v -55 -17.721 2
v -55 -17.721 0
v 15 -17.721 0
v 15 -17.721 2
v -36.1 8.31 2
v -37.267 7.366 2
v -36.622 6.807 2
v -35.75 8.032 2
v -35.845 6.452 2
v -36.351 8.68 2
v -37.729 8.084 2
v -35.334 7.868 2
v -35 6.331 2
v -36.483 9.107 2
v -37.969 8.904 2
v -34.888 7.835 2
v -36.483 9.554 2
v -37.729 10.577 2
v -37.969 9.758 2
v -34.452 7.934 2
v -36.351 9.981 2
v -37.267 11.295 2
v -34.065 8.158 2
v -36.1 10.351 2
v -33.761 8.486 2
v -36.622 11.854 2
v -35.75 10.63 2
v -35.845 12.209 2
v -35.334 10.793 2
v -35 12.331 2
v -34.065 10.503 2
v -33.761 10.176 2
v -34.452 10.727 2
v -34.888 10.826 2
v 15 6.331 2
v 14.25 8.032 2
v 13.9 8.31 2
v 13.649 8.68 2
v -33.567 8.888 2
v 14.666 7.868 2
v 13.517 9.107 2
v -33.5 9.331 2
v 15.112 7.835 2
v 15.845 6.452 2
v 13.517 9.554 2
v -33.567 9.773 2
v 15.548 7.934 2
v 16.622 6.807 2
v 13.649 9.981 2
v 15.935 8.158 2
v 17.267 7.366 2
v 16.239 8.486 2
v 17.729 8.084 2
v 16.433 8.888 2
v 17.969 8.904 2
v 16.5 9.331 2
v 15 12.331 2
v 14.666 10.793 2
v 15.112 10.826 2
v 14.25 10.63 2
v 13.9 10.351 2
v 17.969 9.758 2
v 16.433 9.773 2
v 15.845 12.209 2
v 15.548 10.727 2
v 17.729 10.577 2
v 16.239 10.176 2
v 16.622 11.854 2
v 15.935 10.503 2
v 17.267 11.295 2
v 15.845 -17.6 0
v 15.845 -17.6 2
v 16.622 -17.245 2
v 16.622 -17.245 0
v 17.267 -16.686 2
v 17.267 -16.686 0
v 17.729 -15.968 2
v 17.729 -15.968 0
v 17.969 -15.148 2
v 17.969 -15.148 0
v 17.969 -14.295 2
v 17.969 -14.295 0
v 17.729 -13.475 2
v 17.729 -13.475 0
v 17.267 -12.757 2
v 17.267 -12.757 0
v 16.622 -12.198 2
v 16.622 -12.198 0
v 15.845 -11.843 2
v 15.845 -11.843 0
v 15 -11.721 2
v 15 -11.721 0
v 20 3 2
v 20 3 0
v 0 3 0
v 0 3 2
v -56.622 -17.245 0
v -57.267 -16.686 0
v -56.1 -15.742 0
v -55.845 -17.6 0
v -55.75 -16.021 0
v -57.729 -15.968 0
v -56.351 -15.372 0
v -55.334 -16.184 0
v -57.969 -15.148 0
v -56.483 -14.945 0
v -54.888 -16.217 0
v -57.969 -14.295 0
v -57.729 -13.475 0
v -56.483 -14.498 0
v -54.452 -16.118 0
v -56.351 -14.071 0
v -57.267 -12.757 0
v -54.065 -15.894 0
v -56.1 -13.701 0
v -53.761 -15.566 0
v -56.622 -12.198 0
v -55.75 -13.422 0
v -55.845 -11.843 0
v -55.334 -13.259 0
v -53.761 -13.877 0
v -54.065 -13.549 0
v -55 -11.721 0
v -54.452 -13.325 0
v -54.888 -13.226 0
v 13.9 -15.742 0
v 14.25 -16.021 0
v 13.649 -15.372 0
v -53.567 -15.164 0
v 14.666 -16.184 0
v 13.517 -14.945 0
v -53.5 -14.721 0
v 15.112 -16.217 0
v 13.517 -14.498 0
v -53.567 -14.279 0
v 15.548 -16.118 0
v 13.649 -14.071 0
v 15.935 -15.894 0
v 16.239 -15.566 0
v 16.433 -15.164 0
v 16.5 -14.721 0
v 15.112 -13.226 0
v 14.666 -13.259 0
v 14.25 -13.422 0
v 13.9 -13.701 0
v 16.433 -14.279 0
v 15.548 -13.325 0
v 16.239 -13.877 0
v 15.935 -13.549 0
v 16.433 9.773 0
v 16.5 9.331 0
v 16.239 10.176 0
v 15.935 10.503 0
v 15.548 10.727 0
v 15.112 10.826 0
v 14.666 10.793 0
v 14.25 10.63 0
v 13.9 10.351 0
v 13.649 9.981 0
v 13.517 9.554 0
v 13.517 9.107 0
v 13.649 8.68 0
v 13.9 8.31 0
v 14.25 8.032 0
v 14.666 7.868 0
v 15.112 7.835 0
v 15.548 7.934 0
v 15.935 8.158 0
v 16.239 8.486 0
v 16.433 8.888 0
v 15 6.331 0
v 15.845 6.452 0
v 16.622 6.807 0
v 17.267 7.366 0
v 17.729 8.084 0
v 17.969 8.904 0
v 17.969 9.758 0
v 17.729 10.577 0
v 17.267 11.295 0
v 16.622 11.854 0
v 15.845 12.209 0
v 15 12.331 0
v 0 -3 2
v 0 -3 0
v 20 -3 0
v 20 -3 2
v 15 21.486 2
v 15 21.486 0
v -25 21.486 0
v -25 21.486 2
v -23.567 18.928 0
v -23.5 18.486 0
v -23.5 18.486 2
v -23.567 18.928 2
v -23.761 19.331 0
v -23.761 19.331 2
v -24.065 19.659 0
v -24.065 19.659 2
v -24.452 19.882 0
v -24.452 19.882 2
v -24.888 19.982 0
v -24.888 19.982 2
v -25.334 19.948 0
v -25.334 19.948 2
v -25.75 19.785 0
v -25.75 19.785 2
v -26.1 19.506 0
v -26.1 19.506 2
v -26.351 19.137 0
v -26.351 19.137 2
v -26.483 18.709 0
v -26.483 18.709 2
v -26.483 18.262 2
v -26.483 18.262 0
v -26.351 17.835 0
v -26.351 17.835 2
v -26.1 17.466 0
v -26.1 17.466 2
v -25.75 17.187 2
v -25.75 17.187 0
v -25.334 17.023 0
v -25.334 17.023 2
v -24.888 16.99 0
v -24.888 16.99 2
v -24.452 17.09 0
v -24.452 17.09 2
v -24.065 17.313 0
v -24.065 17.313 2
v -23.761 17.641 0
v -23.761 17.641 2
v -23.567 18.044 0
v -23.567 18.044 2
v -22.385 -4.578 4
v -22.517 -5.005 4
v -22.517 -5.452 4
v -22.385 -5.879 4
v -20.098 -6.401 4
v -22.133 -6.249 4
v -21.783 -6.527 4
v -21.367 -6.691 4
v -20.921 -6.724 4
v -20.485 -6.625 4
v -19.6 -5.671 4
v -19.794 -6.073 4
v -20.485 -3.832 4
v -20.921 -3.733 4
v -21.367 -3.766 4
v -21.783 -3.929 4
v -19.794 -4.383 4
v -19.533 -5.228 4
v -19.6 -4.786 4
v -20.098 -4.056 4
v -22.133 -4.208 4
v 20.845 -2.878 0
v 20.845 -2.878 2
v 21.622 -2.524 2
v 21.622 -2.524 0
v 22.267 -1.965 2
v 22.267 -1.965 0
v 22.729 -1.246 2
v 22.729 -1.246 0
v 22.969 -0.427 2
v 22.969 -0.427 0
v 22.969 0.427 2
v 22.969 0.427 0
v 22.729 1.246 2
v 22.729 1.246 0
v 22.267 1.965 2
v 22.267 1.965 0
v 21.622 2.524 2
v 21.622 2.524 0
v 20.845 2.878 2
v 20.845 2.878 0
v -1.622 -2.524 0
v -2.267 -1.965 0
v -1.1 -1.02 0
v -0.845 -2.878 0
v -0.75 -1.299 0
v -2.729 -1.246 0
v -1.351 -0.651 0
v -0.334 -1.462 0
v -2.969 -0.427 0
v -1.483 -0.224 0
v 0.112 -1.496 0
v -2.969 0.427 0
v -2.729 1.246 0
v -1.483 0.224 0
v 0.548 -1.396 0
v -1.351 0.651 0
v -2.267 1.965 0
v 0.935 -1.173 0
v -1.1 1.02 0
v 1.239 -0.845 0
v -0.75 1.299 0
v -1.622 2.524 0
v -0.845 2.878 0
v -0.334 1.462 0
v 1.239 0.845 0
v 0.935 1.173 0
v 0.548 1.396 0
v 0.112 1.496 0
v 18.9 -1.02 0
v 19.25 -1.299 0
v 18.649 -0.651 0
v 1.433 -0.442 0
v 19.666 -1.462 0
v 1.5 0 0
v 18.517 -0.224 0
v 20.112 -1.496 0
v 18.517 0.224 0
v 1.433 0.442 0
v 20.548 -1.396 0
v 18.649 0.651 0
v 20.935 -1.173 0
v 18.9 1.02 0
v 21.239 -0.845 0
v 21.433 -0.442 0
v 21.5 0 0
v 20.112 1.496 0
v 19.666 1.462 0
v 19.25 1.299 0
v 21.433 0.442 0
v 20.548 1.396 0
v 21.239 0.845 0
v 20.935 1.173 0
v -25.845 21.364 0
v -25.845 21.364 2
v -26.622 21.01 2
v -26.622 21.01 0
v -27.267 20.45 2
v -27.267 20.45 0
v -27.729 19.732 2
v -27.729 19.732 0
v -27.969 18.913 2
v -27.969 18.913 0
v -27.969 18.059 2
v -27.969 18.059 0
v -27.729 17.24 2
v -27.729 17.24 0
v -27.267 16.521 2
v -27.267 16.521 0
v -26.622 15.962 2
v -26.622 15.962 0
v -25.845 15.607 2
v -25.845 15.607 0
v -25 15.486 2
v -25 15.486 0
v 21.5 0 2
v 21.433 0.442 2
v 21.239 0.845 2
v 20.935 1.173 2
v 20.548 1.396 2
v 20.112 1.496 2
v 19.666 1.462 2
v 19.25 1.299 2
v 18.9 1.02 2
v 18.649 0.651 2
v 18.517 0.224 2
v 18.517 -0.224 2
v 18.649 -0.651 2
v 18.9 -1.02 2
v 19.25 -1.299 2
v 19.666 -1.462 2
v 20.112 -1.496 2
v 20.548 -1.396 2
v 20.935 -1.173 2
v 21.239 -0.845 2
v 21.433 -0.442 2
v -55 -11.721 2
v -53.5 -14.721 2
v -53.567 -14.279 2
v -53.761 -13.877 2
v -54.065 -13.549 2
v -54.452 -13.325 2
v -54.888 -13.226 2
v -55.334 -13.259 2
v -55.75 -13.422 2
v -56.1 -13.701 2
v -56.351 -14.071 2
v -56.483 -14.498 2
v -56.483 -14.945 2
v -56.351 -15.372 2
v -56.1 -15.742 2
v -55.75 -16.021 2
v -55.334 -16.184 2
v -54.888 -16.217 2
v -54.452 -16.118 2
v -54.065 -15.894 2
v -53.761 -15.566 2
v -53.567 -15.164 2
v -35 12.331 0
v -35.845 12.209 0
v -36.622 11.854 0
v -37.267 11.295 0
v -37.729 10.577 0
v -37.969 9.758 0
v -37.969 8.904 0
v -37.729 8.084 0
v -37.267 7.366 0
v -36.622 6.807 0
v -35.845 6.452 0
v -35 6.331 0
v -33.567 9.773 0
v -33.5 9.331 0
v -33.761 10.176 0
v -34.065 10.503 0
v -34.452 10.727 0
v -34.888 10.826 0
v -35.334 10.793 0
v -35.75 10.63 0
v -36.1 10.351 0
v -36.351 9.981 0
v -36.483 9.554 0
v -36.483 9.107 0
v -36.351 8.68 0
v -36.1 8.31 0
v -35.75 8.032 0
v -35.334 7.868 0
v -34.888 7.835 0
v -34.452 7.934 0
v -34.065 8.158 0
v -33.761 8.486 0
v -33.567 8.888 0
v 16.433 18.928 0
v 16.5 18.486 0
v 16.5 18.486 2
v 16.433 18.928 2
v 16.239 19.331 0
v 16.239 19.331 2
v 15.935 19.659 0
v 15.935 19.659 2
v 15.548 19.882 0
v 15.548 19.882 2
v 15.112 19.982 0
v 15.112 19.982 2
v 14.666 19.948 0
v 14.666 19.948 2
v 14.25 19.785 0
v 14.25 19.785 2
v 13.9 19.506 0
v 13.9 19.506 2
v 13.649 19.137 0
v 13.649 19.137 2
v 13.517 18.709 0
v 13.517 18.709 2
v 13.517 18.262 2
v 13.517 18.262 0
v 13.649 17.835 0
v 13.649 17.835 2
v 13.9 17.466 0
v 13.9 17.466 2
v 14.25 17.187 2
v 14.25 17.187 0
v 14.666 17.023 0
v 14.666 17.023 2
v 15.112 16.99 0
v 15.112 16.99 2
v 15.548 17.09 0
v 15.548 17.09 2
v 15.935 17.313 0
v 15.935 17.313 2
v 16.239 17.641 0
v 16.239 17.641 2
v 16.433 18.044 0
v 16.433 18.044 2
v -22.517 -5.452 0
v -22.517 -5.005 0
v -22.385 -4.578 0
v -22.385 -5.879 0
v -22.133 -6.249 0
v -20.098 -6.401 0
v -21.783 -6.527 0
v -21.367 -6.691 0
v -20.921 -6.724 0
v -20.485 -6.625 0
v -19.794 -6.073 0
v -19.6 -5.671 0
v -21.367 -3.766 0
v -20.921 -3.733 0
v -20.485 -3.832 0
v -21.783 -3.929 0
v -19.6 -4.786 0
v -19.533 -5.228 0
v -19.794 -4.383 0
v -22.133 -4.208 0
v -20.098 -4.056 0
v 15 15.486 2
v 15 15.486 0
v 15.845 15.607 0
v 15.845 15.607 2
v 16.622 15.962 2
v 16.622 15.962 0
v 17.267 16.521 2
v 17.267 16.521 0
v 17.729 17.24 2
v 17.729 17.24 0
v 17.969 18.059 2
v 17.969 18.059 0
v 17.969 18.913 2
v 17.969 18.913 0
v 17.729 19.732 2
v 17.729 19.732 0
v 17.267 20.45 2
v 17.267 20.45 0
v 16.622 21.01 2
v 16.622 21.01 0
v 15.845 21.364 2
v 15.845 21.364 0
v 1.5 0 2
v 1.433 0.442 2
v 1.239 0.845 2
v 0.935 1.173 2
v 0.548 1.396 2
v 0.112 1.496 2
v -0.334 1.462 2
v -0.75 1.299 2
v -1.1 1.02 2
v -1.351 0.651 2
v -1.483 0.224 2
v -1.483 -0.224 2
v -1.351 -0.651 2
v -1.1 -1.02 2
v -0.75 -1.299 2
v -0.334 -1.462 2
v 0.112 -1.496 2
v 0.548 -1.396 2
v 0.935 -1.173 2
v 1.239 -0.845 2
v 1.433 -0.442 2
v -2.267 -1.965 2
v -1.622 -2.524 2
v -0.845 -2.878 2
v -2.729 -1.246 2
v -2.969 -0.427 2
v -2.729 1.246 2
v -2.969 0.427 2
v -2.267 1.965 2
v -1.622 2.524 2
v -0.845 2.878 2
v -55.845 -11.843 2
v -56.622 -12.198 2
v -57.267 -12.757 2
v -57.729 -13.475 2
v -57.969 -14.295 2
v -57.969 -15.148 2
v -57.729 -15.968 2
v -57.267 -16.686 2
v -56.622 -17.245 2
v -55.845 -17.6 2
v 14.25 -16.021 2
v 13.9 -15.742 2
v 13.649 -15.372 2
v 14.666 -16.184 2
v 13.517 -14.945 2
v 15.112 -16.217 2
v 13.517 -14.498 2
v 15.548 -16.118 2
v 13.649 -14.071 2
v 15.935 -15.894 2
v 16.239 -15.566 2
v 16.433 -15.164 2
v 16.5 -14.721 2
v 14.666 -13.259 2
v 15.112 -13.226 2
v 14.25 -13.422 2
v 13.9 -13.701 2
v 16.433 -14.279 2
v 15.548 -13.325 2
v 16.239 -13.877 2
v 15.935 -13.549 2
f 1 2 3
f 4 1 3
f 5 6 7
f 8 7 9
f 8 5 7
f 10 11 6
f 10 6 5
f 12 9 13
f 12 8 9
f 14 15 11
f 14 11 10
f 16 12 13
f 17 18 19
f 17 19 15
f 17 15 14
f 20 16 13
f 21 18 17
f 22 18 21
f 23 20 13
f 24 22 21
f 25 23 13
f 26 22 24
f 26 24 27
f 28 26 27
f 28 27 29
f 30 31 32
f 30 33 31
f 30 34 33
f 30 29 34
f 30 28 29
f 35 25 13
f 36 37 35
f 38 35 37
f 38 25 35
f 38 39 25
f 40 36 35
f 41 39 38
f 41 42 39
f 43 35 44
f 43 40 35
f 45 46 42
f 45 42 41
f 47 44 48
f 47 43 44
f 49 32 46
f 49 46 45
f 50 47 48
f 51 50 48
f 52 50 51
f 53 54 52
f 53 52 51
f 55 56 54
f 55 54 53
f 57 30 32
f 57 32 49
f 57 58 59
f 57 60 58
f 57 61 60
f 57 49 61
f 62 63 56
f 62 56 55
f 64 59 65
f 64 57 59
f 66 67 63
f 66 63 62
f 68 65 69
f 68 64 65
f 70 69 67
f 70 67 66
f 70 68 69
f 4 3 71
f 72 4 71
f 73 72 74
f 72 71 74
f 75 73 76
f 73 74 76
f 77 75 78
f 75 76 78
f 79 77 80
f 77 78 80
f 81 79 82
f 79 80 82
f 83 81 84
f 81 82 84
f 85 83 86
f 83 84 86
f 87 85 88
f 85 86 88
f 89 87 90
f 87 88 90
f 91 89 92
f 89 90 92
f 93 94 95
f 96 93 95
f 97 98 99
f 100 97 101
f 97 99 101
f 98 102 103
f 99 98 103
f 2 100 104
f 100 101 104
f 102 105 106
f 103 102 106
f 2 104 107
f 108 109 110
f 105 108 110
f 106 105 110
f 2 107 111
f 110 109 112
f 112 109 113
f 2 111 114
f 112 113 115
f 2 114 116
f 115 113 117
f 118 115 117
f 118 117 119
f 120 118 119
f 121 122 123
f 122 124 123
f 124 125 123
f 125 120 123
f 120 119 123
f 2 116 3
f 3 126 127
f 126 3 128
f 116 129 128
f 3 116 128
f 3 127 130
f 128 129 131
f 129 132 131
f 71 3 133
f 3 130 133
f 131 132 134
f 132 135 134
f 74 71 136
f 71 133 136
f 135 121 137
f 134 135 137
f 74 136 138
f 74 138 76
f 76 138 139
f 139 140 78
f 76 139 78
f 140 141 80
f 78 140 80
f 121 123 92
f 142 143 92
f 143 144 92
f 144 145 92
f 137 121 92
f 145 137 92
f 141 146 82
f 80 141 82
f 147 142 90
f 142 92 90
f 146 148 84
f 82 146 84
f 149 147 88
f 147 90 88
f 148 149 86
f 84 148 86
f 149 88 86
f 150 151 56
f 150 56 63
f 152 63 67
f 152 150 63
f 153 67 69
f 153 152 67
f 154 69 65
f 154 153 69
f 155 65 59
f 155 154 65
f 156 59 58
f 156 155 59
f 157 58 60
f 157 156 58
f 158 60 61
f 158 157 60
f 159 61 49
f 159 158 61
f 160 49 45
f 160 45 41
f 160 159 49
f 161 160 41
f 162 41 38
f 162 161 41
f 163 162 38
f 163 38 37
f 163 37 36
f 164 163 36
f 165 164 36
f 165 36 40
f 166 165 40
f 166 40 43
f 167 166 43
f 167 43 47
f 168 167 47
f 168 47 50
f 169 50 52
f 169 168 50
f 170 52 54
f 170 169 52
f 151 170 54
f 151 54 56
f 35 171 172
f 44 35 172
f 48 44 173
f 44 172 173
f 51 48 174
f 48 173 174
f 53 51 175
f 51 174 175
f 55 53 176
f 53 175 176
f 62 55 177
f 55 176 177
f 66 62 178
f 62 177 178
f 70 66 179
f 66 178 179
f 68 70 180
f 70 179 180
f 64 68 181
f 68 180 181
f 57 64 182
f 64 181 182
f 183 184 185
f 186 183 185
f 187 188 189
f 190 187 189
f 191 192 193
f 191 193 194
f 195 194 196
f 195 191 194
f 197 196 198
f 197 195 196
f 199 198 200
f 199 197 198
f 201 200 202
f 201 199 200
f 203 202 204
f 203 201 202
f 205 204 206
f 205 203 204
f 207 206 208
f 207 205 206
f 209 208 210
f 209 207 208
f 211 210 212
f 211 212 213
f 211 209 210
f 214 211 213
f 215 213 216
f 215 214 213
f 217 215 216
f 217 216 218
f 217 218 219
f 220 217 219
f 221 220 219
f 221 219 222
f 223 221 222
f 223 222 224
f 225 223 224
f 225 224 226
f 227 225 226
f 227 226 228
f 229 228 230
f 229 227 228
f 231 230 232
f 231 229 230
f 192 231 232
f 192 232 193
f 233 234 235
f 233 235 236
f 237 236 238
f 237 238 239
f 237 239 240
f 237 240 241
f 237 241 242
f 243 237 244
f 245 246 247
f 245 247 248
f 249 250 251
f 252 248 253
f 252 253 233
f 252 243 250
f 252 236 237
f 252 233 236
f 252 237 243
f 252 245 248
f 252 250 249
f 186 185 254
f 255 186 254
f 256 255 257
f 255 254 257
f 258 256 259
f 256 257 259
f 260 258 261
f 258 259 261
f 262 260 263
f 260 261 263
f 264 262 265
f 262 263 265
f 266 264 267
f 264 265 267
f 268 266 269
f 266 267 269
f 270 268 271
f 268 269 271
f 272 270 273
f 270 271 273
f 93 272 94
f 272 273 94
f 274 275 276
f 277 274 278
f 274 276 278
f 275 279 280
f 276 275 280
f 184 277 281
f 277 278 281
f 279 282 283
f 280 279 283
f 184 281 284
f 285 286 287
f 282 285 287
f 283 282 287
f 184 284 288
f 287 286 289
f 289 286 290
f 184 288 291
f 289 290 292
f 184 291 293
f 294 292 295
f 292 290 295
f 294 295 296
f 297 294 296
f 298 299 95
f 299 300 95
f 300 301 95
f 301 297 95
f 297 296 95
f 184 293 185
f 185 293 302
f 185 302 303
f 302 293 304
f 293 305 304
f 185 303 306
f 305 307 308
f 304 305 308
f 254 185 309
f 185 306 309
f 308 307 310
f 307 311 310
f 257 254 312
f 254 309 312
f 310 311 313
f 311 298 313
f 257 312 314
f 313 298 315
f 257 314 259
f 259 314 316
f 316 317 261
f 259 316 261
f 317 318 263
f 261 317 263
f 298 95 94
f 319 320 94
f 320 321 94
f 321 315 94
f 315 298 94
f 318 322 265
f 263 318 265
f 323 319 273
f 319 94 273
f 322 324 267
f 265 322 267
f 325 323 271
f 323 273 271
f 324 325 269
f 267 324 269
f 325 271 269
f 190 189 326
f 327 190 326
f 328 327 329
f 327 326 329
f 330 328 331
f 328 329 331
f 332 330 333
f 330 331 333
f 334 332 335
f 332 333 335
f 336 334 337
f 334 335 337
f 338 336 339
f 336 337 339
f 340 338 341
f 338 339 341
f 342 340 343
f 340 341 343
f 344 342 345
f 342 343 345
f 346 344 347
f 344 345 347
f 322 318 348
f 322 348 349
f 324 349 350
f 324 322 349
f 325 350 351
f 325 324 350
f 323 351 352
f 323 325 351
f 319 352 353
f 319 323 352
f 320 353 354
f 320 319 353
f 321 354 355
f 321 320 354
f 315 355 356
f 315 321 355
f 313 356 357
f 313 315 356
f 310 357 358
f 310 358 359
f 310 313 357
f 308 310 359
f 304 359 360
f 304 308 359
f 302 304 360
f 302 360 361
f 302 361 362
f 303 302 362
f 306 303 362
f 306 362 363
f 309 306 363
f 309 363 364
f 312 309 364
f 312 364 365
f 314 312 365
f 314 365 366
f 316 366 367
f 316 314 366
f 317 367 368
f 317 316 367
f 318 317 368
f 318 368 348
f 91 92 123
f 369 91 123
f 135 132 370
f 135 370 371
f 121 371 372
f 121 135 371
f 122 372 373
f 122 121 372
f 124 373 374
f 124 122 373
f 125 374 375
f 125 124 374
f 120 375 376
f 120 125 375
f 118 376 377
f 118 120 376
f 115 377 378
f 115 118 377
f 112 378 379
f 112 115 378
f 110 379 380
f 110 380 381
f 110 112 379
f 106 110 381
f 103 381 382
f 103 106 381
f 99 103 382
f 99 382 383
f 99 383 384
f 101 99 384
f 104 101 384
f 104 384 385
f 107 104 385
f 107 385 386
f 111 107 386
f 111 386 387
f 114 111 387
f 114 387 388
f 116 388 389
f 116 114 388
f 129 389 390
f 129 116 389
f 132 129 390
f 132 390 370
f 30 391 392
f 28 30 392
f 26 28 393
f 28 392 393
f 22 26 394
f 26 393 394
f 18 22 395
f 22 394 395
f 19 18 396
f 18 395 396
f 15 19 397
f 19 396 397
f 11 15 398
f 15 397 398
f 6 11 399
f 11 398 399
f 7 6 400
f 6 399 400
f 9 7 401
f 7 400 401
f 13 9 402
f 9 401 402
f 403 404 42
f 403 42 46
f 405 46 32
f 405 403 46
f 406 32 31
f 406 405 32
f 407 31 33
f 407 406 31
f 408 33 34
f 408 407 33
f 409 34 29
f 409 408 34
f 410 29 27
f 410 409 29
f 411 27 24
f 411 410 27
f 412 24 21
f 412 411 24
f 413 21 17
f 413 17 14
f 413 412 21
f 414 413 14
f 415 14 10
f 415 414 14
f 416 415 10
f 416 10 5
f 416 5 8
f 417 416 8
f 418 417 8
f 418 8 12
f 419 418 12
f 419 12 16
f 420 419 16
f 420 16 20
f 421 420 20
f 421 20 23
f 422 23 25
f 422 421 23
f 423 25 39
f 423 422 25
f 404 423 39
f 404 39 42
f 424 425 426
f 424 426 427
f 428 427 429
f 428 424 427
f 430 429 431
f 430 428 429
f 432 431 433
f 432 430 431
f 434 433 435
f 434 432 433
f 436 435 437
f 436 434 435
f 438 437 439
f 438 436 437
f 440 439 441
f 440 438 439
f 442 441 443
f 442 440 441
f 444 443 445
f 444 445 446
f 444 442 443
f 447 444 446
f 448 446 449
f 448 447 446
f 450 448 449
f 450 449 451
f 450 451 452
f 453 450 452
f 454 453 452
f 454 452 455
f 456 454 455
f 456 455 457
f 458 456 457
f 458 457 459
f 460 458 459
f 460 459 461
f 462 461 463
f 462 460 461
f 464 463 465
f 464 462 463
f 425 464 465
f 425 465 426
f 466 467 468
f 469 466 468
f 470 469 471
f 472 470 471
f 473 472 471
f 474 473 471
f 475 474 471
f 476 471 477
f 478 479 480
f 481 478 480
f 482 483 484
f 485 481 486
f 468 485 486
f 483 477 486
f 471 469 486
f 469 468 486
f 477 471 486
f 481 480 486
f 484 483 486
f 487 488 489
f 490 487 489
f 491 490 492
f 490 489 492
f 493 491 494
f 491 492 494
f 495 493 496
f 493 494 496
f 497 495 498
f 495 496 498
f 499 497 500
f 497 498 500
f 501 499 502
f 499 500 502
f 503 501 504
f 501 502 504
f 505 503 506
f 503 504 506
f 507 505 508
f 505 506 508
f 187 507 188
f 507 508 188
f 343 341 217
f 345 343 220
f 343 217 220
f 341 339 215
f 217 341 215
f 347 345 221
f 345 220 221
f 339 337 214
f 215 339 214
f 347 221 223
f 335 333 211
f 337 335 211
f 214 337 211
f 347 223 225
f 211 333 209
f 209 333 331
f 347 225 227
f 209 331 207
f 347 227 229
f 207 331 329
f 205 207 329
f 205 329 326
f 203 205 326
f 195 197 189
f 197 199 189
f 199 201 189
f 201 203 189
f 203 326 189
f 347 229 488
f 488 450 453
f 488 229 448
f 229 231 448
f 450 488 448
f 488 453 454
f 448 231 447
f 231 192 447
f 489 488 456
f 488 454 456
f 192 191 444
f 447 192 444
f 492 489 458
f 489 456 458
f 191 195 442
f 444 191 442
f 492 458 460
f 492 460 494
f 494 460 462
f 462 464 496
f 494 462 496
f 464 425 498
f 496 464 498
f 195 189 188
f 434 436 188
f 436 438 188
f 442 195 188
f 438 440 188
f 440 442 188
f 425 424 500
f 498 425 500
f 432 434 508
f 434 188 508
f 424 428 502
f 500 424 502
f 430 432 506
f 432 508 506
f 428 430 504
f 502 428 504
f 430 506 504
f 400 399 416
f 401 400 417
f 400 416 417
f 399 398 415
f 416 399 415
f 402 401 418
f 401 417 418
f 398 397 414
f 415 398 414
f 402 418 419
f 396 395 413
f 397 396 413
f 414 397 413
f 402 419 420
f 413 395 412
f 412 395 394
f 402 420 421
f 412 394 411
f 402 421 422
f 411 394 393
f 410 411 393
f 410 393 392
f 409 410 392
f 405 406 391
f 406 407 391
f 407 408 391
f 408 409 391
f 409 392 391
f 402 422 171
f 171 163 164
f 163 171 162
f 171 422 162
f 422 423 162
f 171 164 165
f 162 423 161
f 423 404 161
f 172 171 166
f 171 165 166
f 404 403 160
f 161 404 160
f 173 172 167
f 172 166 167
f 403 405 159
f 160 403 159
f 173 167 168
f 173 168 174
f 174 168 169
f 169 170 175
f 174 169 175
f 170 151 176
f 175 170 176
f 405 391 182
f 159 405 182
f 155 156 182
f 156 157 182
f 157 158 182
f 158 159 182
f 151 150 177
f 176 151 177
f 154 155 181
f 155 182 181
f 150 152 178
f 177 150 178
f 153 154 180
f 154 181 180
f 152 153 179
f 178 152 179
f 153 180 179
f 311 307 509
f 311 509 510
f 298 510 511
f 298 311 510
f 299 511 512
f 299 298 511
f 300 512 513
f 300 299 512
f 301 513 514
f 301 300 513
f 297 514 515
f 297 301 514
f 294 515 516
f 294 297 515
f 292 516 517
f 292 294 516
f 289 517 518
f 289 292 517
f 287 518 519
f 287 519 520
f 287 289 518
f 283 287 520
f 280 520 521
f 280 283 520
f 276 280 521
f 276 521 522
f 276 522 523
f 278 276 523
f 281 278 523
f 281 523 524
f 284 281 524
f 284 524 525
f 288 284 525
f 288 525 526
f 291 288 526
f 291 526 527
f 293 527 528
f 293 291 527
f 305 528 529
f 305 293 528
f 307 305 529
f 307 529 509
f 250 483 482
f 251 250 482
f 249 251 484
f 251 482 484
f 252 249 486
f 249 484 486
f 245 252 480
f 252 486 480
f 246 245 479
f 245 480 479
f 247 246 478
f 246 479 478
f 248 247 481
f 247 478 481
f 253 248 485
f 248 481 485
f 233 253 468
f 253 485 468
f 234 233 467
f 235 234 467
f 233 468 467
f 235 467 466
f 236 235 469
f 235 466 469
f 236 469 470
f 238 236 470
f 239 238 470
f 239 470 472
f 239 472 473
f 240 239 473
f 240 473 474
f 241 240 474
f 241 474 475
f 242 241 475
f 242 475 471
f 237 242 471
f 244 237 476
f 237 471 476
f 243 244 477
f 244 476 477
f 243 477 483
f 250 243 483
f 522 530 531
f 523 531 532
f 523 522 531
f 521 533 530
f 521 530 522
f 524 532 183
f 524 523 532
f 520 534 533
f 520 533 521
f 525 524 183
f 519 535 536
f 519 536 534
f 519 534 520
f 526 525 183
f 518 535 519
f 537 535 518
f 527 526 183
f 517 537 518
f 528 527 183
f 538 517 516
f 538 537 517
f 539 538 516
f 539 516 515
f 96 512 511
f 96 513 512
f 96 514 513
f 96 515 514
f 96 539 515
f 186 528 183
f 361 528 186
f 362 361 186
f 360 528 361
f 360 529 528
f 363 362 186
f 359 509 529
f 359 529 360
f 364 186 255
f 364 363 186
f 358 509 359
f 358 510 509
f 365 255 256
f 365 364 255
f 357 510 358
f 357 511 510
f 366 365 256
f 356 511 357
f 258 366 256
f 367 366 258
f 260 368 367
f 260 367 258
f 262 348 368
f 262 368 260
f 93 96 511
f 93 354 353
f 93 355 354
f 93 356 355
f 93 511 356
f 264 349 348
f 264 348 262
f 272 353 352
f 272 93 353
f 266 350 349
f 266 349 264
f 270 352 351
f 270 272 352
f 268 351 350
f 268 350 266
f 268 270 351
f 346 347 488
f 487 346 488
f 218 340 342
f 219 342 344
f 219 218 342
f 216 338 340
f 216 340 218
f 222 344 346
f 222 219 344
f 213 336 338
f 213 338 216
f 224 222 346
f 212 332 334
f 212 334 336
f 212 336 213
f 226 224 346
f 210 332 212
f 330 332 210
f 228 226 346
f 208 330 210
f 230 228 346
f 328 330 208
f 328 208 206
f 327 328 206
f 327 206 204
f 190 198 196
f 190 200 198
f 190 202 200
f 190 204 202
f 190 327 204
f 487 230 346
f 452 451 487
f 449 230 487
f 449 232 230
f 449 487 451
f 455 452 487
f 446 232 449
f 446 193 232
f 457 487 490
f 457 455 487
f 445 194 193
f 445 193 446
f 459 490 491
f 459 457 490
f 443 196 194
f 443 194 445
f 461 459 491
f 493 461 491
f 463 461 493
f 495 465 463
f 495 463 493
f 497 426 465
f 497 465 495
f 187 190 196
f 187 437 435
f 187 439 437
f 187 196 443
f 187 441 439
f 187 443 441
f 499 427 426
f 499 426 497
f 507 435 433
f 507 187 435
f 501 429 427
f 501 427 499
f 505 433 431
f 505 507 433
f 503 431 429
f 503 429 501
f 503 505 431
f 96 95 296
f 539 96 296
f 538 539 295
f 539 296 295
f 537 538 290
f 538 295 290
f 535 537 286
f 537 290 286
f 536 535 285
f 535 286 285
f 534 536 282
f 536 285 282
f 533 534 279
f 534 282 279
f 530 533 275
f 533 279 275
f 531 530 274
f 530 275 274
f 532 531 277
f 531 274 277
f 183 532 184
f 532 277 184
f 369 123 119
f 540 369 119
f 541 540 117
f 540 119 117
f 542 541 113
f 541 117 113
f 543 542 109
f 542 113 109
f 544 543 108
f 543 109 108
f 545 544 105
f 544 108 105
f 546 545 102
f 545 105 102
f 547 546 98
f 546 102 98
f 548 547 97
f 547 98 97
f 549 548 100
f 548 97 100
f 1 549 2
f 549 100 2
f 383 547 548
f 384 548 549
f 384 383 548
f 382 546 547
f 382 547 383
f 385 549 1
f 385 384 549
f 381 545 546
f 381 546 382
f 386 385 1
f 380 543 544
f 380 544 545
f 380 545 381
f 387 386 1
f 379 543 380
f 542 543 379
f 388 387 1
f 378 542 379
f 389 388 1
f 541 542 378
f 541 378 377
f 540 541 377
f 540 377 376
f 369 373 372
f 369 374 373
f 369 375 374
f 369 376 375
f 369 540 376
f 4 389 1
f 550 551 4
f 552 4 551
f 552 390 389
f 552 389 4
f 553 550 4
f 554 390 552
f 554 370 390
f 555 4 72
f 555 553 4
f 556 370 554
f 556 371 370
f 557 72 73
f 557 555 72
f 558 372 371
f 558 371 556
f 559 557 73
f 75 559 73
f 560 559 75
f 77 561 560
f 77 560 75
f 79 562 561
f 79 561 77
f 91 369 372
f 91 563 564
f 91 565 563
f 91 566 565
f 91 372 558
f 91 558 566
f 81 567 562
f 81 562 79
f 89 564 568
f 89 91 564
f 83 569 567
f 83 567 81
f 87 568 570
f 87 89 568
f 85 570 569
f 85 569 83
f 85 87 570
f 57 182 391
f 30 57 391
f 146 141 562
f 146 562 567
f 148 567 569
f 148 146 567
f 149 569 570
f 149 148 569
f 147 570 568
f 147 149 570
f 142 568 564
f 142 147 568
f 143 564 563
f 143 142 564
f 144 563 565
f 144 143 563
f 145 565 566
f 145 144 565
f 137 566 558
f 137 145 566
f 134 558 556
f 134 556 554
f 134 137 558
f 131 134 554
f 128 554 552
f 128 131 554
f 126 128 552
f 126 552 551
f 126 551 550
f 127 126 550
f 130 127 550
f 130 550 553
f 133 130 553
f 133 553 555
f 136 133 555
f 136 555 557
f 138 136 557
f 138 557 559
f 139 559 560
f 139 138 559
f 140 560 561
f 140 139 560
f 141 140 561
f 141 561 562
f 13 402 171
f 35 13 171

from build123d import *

# Parameters (mm, degrees)
F0_R     = 1.5
F1_DEPTH = 2
F2_R     = 1.5
F3_DEPTH = 2
F4_R     = 1.5
F5_DEPTH = 2
F6_R     = 1.5
F7_DEPTH = 2
F8_R     = 1.5
F9_DEPTH = 4


with BuildPart() as f1:
    # F0 (on Top) → F1 (new body)
    with BuildSketch(Plane.XY):
        with BuildLine():
            Line((20, 3), (0, 3))
            ThreePointArc((0, 3), (-3, 0), (0, -3))
            Line((0, -3), (20, -3))
            ThreePointArc((20, -3), (23, 0), (20, 3))
        make_face()
        Circle(F0_R, mode=Mode.SUBTRACT)
        with Locations((20, 0)):
            Circle(F0_R, mode=Mode.SUBTRACT)
    extrude(amount=F1_DEPTH)


with BuildPart() as f3:
    # F2 (on Top) → F3 (new body)
    with BuildSketch(Plane.XY):
        with BuildLine():
            Line((15, 21.485859), (-25, 21.485859))
            ThreePointArc((-25, 21.485859), (-28, 18.485859), (-25, 15.485859))
            Line((-25, 15.485859), (15, 15.485859))
            ThreePointArc((15, 15.485859), (18, 18.485859), (15, 21.485859))
        make_face()
        with Locations((-25, 18.485859)):
            Circle(F2_R, mode=Mode.SUBTRACT)
        with Locations((15, 18.485859)):
            Circle(F2_R, mode=Mode.SUBTRACT)
    extrude(amount=F3_DEPTH)


with BuildPart() as f5:
    # F4 (on Top) → F5 (new body)
    with BuildSketch(Plane.XY):
        with BuildLine():
            Line((15, -11.721496), (-55, -11.721496))
            ThreePointArc((-55, -11.721496), (-58, -14.721496), (-55, -17.721496))
            Line((-55, -17.721496), (15, -17.721496))
            ThreePointArc((15, -17.721496), (18, -14.721496), (15, -11.721496))
        make_face()
        with Locations((-55, -14.721496)):
            Circle(F4_R, mode=Mode.SUBTRACT)
        with Locations((15, -14.721496)):
            Circle(F4_R, mode=Mode.SUBTRACT)
    extrude(amount=F5_DEPTH)


with BuildPart() as f7:
    # F6 (on Top) → F7 (new body)
    with BuildSketch(Plane.XY):
        with BuildLine():
            Line((15, 12.33063), (-35, 12.33063))
            ThreePointArc((-35, 12.33063), (-38, 9.33063), (-35, 6.33063))
            Line((-35, 6.33063), (15, 6.33063))
            ThreePointArc((15, 6.33063), (18, 9.33063), (15, 12.33063))
        make_face()
        with Locations((-35, 9.33063)):
            Circle(F6_R, mode=Mode.SUBTRACT)
        with Locations((15, 9.33063)):
            Circle(F6_R, mode=Mode.SUBTRACT)
    extrude(amount=F7_DEPTH)


with BuildPart() as f9:
    # F8 (on Top) → F9 (new body)
    with BuildSketch(Plane.XY):
        with Locations((-21.033281, -5.228397)):
            Circle(F8_R)
    extrude(amount=F9_DEPTH)


solid = Compound([f1.part, f3.part, f5.part, f7.part, f9.part])
